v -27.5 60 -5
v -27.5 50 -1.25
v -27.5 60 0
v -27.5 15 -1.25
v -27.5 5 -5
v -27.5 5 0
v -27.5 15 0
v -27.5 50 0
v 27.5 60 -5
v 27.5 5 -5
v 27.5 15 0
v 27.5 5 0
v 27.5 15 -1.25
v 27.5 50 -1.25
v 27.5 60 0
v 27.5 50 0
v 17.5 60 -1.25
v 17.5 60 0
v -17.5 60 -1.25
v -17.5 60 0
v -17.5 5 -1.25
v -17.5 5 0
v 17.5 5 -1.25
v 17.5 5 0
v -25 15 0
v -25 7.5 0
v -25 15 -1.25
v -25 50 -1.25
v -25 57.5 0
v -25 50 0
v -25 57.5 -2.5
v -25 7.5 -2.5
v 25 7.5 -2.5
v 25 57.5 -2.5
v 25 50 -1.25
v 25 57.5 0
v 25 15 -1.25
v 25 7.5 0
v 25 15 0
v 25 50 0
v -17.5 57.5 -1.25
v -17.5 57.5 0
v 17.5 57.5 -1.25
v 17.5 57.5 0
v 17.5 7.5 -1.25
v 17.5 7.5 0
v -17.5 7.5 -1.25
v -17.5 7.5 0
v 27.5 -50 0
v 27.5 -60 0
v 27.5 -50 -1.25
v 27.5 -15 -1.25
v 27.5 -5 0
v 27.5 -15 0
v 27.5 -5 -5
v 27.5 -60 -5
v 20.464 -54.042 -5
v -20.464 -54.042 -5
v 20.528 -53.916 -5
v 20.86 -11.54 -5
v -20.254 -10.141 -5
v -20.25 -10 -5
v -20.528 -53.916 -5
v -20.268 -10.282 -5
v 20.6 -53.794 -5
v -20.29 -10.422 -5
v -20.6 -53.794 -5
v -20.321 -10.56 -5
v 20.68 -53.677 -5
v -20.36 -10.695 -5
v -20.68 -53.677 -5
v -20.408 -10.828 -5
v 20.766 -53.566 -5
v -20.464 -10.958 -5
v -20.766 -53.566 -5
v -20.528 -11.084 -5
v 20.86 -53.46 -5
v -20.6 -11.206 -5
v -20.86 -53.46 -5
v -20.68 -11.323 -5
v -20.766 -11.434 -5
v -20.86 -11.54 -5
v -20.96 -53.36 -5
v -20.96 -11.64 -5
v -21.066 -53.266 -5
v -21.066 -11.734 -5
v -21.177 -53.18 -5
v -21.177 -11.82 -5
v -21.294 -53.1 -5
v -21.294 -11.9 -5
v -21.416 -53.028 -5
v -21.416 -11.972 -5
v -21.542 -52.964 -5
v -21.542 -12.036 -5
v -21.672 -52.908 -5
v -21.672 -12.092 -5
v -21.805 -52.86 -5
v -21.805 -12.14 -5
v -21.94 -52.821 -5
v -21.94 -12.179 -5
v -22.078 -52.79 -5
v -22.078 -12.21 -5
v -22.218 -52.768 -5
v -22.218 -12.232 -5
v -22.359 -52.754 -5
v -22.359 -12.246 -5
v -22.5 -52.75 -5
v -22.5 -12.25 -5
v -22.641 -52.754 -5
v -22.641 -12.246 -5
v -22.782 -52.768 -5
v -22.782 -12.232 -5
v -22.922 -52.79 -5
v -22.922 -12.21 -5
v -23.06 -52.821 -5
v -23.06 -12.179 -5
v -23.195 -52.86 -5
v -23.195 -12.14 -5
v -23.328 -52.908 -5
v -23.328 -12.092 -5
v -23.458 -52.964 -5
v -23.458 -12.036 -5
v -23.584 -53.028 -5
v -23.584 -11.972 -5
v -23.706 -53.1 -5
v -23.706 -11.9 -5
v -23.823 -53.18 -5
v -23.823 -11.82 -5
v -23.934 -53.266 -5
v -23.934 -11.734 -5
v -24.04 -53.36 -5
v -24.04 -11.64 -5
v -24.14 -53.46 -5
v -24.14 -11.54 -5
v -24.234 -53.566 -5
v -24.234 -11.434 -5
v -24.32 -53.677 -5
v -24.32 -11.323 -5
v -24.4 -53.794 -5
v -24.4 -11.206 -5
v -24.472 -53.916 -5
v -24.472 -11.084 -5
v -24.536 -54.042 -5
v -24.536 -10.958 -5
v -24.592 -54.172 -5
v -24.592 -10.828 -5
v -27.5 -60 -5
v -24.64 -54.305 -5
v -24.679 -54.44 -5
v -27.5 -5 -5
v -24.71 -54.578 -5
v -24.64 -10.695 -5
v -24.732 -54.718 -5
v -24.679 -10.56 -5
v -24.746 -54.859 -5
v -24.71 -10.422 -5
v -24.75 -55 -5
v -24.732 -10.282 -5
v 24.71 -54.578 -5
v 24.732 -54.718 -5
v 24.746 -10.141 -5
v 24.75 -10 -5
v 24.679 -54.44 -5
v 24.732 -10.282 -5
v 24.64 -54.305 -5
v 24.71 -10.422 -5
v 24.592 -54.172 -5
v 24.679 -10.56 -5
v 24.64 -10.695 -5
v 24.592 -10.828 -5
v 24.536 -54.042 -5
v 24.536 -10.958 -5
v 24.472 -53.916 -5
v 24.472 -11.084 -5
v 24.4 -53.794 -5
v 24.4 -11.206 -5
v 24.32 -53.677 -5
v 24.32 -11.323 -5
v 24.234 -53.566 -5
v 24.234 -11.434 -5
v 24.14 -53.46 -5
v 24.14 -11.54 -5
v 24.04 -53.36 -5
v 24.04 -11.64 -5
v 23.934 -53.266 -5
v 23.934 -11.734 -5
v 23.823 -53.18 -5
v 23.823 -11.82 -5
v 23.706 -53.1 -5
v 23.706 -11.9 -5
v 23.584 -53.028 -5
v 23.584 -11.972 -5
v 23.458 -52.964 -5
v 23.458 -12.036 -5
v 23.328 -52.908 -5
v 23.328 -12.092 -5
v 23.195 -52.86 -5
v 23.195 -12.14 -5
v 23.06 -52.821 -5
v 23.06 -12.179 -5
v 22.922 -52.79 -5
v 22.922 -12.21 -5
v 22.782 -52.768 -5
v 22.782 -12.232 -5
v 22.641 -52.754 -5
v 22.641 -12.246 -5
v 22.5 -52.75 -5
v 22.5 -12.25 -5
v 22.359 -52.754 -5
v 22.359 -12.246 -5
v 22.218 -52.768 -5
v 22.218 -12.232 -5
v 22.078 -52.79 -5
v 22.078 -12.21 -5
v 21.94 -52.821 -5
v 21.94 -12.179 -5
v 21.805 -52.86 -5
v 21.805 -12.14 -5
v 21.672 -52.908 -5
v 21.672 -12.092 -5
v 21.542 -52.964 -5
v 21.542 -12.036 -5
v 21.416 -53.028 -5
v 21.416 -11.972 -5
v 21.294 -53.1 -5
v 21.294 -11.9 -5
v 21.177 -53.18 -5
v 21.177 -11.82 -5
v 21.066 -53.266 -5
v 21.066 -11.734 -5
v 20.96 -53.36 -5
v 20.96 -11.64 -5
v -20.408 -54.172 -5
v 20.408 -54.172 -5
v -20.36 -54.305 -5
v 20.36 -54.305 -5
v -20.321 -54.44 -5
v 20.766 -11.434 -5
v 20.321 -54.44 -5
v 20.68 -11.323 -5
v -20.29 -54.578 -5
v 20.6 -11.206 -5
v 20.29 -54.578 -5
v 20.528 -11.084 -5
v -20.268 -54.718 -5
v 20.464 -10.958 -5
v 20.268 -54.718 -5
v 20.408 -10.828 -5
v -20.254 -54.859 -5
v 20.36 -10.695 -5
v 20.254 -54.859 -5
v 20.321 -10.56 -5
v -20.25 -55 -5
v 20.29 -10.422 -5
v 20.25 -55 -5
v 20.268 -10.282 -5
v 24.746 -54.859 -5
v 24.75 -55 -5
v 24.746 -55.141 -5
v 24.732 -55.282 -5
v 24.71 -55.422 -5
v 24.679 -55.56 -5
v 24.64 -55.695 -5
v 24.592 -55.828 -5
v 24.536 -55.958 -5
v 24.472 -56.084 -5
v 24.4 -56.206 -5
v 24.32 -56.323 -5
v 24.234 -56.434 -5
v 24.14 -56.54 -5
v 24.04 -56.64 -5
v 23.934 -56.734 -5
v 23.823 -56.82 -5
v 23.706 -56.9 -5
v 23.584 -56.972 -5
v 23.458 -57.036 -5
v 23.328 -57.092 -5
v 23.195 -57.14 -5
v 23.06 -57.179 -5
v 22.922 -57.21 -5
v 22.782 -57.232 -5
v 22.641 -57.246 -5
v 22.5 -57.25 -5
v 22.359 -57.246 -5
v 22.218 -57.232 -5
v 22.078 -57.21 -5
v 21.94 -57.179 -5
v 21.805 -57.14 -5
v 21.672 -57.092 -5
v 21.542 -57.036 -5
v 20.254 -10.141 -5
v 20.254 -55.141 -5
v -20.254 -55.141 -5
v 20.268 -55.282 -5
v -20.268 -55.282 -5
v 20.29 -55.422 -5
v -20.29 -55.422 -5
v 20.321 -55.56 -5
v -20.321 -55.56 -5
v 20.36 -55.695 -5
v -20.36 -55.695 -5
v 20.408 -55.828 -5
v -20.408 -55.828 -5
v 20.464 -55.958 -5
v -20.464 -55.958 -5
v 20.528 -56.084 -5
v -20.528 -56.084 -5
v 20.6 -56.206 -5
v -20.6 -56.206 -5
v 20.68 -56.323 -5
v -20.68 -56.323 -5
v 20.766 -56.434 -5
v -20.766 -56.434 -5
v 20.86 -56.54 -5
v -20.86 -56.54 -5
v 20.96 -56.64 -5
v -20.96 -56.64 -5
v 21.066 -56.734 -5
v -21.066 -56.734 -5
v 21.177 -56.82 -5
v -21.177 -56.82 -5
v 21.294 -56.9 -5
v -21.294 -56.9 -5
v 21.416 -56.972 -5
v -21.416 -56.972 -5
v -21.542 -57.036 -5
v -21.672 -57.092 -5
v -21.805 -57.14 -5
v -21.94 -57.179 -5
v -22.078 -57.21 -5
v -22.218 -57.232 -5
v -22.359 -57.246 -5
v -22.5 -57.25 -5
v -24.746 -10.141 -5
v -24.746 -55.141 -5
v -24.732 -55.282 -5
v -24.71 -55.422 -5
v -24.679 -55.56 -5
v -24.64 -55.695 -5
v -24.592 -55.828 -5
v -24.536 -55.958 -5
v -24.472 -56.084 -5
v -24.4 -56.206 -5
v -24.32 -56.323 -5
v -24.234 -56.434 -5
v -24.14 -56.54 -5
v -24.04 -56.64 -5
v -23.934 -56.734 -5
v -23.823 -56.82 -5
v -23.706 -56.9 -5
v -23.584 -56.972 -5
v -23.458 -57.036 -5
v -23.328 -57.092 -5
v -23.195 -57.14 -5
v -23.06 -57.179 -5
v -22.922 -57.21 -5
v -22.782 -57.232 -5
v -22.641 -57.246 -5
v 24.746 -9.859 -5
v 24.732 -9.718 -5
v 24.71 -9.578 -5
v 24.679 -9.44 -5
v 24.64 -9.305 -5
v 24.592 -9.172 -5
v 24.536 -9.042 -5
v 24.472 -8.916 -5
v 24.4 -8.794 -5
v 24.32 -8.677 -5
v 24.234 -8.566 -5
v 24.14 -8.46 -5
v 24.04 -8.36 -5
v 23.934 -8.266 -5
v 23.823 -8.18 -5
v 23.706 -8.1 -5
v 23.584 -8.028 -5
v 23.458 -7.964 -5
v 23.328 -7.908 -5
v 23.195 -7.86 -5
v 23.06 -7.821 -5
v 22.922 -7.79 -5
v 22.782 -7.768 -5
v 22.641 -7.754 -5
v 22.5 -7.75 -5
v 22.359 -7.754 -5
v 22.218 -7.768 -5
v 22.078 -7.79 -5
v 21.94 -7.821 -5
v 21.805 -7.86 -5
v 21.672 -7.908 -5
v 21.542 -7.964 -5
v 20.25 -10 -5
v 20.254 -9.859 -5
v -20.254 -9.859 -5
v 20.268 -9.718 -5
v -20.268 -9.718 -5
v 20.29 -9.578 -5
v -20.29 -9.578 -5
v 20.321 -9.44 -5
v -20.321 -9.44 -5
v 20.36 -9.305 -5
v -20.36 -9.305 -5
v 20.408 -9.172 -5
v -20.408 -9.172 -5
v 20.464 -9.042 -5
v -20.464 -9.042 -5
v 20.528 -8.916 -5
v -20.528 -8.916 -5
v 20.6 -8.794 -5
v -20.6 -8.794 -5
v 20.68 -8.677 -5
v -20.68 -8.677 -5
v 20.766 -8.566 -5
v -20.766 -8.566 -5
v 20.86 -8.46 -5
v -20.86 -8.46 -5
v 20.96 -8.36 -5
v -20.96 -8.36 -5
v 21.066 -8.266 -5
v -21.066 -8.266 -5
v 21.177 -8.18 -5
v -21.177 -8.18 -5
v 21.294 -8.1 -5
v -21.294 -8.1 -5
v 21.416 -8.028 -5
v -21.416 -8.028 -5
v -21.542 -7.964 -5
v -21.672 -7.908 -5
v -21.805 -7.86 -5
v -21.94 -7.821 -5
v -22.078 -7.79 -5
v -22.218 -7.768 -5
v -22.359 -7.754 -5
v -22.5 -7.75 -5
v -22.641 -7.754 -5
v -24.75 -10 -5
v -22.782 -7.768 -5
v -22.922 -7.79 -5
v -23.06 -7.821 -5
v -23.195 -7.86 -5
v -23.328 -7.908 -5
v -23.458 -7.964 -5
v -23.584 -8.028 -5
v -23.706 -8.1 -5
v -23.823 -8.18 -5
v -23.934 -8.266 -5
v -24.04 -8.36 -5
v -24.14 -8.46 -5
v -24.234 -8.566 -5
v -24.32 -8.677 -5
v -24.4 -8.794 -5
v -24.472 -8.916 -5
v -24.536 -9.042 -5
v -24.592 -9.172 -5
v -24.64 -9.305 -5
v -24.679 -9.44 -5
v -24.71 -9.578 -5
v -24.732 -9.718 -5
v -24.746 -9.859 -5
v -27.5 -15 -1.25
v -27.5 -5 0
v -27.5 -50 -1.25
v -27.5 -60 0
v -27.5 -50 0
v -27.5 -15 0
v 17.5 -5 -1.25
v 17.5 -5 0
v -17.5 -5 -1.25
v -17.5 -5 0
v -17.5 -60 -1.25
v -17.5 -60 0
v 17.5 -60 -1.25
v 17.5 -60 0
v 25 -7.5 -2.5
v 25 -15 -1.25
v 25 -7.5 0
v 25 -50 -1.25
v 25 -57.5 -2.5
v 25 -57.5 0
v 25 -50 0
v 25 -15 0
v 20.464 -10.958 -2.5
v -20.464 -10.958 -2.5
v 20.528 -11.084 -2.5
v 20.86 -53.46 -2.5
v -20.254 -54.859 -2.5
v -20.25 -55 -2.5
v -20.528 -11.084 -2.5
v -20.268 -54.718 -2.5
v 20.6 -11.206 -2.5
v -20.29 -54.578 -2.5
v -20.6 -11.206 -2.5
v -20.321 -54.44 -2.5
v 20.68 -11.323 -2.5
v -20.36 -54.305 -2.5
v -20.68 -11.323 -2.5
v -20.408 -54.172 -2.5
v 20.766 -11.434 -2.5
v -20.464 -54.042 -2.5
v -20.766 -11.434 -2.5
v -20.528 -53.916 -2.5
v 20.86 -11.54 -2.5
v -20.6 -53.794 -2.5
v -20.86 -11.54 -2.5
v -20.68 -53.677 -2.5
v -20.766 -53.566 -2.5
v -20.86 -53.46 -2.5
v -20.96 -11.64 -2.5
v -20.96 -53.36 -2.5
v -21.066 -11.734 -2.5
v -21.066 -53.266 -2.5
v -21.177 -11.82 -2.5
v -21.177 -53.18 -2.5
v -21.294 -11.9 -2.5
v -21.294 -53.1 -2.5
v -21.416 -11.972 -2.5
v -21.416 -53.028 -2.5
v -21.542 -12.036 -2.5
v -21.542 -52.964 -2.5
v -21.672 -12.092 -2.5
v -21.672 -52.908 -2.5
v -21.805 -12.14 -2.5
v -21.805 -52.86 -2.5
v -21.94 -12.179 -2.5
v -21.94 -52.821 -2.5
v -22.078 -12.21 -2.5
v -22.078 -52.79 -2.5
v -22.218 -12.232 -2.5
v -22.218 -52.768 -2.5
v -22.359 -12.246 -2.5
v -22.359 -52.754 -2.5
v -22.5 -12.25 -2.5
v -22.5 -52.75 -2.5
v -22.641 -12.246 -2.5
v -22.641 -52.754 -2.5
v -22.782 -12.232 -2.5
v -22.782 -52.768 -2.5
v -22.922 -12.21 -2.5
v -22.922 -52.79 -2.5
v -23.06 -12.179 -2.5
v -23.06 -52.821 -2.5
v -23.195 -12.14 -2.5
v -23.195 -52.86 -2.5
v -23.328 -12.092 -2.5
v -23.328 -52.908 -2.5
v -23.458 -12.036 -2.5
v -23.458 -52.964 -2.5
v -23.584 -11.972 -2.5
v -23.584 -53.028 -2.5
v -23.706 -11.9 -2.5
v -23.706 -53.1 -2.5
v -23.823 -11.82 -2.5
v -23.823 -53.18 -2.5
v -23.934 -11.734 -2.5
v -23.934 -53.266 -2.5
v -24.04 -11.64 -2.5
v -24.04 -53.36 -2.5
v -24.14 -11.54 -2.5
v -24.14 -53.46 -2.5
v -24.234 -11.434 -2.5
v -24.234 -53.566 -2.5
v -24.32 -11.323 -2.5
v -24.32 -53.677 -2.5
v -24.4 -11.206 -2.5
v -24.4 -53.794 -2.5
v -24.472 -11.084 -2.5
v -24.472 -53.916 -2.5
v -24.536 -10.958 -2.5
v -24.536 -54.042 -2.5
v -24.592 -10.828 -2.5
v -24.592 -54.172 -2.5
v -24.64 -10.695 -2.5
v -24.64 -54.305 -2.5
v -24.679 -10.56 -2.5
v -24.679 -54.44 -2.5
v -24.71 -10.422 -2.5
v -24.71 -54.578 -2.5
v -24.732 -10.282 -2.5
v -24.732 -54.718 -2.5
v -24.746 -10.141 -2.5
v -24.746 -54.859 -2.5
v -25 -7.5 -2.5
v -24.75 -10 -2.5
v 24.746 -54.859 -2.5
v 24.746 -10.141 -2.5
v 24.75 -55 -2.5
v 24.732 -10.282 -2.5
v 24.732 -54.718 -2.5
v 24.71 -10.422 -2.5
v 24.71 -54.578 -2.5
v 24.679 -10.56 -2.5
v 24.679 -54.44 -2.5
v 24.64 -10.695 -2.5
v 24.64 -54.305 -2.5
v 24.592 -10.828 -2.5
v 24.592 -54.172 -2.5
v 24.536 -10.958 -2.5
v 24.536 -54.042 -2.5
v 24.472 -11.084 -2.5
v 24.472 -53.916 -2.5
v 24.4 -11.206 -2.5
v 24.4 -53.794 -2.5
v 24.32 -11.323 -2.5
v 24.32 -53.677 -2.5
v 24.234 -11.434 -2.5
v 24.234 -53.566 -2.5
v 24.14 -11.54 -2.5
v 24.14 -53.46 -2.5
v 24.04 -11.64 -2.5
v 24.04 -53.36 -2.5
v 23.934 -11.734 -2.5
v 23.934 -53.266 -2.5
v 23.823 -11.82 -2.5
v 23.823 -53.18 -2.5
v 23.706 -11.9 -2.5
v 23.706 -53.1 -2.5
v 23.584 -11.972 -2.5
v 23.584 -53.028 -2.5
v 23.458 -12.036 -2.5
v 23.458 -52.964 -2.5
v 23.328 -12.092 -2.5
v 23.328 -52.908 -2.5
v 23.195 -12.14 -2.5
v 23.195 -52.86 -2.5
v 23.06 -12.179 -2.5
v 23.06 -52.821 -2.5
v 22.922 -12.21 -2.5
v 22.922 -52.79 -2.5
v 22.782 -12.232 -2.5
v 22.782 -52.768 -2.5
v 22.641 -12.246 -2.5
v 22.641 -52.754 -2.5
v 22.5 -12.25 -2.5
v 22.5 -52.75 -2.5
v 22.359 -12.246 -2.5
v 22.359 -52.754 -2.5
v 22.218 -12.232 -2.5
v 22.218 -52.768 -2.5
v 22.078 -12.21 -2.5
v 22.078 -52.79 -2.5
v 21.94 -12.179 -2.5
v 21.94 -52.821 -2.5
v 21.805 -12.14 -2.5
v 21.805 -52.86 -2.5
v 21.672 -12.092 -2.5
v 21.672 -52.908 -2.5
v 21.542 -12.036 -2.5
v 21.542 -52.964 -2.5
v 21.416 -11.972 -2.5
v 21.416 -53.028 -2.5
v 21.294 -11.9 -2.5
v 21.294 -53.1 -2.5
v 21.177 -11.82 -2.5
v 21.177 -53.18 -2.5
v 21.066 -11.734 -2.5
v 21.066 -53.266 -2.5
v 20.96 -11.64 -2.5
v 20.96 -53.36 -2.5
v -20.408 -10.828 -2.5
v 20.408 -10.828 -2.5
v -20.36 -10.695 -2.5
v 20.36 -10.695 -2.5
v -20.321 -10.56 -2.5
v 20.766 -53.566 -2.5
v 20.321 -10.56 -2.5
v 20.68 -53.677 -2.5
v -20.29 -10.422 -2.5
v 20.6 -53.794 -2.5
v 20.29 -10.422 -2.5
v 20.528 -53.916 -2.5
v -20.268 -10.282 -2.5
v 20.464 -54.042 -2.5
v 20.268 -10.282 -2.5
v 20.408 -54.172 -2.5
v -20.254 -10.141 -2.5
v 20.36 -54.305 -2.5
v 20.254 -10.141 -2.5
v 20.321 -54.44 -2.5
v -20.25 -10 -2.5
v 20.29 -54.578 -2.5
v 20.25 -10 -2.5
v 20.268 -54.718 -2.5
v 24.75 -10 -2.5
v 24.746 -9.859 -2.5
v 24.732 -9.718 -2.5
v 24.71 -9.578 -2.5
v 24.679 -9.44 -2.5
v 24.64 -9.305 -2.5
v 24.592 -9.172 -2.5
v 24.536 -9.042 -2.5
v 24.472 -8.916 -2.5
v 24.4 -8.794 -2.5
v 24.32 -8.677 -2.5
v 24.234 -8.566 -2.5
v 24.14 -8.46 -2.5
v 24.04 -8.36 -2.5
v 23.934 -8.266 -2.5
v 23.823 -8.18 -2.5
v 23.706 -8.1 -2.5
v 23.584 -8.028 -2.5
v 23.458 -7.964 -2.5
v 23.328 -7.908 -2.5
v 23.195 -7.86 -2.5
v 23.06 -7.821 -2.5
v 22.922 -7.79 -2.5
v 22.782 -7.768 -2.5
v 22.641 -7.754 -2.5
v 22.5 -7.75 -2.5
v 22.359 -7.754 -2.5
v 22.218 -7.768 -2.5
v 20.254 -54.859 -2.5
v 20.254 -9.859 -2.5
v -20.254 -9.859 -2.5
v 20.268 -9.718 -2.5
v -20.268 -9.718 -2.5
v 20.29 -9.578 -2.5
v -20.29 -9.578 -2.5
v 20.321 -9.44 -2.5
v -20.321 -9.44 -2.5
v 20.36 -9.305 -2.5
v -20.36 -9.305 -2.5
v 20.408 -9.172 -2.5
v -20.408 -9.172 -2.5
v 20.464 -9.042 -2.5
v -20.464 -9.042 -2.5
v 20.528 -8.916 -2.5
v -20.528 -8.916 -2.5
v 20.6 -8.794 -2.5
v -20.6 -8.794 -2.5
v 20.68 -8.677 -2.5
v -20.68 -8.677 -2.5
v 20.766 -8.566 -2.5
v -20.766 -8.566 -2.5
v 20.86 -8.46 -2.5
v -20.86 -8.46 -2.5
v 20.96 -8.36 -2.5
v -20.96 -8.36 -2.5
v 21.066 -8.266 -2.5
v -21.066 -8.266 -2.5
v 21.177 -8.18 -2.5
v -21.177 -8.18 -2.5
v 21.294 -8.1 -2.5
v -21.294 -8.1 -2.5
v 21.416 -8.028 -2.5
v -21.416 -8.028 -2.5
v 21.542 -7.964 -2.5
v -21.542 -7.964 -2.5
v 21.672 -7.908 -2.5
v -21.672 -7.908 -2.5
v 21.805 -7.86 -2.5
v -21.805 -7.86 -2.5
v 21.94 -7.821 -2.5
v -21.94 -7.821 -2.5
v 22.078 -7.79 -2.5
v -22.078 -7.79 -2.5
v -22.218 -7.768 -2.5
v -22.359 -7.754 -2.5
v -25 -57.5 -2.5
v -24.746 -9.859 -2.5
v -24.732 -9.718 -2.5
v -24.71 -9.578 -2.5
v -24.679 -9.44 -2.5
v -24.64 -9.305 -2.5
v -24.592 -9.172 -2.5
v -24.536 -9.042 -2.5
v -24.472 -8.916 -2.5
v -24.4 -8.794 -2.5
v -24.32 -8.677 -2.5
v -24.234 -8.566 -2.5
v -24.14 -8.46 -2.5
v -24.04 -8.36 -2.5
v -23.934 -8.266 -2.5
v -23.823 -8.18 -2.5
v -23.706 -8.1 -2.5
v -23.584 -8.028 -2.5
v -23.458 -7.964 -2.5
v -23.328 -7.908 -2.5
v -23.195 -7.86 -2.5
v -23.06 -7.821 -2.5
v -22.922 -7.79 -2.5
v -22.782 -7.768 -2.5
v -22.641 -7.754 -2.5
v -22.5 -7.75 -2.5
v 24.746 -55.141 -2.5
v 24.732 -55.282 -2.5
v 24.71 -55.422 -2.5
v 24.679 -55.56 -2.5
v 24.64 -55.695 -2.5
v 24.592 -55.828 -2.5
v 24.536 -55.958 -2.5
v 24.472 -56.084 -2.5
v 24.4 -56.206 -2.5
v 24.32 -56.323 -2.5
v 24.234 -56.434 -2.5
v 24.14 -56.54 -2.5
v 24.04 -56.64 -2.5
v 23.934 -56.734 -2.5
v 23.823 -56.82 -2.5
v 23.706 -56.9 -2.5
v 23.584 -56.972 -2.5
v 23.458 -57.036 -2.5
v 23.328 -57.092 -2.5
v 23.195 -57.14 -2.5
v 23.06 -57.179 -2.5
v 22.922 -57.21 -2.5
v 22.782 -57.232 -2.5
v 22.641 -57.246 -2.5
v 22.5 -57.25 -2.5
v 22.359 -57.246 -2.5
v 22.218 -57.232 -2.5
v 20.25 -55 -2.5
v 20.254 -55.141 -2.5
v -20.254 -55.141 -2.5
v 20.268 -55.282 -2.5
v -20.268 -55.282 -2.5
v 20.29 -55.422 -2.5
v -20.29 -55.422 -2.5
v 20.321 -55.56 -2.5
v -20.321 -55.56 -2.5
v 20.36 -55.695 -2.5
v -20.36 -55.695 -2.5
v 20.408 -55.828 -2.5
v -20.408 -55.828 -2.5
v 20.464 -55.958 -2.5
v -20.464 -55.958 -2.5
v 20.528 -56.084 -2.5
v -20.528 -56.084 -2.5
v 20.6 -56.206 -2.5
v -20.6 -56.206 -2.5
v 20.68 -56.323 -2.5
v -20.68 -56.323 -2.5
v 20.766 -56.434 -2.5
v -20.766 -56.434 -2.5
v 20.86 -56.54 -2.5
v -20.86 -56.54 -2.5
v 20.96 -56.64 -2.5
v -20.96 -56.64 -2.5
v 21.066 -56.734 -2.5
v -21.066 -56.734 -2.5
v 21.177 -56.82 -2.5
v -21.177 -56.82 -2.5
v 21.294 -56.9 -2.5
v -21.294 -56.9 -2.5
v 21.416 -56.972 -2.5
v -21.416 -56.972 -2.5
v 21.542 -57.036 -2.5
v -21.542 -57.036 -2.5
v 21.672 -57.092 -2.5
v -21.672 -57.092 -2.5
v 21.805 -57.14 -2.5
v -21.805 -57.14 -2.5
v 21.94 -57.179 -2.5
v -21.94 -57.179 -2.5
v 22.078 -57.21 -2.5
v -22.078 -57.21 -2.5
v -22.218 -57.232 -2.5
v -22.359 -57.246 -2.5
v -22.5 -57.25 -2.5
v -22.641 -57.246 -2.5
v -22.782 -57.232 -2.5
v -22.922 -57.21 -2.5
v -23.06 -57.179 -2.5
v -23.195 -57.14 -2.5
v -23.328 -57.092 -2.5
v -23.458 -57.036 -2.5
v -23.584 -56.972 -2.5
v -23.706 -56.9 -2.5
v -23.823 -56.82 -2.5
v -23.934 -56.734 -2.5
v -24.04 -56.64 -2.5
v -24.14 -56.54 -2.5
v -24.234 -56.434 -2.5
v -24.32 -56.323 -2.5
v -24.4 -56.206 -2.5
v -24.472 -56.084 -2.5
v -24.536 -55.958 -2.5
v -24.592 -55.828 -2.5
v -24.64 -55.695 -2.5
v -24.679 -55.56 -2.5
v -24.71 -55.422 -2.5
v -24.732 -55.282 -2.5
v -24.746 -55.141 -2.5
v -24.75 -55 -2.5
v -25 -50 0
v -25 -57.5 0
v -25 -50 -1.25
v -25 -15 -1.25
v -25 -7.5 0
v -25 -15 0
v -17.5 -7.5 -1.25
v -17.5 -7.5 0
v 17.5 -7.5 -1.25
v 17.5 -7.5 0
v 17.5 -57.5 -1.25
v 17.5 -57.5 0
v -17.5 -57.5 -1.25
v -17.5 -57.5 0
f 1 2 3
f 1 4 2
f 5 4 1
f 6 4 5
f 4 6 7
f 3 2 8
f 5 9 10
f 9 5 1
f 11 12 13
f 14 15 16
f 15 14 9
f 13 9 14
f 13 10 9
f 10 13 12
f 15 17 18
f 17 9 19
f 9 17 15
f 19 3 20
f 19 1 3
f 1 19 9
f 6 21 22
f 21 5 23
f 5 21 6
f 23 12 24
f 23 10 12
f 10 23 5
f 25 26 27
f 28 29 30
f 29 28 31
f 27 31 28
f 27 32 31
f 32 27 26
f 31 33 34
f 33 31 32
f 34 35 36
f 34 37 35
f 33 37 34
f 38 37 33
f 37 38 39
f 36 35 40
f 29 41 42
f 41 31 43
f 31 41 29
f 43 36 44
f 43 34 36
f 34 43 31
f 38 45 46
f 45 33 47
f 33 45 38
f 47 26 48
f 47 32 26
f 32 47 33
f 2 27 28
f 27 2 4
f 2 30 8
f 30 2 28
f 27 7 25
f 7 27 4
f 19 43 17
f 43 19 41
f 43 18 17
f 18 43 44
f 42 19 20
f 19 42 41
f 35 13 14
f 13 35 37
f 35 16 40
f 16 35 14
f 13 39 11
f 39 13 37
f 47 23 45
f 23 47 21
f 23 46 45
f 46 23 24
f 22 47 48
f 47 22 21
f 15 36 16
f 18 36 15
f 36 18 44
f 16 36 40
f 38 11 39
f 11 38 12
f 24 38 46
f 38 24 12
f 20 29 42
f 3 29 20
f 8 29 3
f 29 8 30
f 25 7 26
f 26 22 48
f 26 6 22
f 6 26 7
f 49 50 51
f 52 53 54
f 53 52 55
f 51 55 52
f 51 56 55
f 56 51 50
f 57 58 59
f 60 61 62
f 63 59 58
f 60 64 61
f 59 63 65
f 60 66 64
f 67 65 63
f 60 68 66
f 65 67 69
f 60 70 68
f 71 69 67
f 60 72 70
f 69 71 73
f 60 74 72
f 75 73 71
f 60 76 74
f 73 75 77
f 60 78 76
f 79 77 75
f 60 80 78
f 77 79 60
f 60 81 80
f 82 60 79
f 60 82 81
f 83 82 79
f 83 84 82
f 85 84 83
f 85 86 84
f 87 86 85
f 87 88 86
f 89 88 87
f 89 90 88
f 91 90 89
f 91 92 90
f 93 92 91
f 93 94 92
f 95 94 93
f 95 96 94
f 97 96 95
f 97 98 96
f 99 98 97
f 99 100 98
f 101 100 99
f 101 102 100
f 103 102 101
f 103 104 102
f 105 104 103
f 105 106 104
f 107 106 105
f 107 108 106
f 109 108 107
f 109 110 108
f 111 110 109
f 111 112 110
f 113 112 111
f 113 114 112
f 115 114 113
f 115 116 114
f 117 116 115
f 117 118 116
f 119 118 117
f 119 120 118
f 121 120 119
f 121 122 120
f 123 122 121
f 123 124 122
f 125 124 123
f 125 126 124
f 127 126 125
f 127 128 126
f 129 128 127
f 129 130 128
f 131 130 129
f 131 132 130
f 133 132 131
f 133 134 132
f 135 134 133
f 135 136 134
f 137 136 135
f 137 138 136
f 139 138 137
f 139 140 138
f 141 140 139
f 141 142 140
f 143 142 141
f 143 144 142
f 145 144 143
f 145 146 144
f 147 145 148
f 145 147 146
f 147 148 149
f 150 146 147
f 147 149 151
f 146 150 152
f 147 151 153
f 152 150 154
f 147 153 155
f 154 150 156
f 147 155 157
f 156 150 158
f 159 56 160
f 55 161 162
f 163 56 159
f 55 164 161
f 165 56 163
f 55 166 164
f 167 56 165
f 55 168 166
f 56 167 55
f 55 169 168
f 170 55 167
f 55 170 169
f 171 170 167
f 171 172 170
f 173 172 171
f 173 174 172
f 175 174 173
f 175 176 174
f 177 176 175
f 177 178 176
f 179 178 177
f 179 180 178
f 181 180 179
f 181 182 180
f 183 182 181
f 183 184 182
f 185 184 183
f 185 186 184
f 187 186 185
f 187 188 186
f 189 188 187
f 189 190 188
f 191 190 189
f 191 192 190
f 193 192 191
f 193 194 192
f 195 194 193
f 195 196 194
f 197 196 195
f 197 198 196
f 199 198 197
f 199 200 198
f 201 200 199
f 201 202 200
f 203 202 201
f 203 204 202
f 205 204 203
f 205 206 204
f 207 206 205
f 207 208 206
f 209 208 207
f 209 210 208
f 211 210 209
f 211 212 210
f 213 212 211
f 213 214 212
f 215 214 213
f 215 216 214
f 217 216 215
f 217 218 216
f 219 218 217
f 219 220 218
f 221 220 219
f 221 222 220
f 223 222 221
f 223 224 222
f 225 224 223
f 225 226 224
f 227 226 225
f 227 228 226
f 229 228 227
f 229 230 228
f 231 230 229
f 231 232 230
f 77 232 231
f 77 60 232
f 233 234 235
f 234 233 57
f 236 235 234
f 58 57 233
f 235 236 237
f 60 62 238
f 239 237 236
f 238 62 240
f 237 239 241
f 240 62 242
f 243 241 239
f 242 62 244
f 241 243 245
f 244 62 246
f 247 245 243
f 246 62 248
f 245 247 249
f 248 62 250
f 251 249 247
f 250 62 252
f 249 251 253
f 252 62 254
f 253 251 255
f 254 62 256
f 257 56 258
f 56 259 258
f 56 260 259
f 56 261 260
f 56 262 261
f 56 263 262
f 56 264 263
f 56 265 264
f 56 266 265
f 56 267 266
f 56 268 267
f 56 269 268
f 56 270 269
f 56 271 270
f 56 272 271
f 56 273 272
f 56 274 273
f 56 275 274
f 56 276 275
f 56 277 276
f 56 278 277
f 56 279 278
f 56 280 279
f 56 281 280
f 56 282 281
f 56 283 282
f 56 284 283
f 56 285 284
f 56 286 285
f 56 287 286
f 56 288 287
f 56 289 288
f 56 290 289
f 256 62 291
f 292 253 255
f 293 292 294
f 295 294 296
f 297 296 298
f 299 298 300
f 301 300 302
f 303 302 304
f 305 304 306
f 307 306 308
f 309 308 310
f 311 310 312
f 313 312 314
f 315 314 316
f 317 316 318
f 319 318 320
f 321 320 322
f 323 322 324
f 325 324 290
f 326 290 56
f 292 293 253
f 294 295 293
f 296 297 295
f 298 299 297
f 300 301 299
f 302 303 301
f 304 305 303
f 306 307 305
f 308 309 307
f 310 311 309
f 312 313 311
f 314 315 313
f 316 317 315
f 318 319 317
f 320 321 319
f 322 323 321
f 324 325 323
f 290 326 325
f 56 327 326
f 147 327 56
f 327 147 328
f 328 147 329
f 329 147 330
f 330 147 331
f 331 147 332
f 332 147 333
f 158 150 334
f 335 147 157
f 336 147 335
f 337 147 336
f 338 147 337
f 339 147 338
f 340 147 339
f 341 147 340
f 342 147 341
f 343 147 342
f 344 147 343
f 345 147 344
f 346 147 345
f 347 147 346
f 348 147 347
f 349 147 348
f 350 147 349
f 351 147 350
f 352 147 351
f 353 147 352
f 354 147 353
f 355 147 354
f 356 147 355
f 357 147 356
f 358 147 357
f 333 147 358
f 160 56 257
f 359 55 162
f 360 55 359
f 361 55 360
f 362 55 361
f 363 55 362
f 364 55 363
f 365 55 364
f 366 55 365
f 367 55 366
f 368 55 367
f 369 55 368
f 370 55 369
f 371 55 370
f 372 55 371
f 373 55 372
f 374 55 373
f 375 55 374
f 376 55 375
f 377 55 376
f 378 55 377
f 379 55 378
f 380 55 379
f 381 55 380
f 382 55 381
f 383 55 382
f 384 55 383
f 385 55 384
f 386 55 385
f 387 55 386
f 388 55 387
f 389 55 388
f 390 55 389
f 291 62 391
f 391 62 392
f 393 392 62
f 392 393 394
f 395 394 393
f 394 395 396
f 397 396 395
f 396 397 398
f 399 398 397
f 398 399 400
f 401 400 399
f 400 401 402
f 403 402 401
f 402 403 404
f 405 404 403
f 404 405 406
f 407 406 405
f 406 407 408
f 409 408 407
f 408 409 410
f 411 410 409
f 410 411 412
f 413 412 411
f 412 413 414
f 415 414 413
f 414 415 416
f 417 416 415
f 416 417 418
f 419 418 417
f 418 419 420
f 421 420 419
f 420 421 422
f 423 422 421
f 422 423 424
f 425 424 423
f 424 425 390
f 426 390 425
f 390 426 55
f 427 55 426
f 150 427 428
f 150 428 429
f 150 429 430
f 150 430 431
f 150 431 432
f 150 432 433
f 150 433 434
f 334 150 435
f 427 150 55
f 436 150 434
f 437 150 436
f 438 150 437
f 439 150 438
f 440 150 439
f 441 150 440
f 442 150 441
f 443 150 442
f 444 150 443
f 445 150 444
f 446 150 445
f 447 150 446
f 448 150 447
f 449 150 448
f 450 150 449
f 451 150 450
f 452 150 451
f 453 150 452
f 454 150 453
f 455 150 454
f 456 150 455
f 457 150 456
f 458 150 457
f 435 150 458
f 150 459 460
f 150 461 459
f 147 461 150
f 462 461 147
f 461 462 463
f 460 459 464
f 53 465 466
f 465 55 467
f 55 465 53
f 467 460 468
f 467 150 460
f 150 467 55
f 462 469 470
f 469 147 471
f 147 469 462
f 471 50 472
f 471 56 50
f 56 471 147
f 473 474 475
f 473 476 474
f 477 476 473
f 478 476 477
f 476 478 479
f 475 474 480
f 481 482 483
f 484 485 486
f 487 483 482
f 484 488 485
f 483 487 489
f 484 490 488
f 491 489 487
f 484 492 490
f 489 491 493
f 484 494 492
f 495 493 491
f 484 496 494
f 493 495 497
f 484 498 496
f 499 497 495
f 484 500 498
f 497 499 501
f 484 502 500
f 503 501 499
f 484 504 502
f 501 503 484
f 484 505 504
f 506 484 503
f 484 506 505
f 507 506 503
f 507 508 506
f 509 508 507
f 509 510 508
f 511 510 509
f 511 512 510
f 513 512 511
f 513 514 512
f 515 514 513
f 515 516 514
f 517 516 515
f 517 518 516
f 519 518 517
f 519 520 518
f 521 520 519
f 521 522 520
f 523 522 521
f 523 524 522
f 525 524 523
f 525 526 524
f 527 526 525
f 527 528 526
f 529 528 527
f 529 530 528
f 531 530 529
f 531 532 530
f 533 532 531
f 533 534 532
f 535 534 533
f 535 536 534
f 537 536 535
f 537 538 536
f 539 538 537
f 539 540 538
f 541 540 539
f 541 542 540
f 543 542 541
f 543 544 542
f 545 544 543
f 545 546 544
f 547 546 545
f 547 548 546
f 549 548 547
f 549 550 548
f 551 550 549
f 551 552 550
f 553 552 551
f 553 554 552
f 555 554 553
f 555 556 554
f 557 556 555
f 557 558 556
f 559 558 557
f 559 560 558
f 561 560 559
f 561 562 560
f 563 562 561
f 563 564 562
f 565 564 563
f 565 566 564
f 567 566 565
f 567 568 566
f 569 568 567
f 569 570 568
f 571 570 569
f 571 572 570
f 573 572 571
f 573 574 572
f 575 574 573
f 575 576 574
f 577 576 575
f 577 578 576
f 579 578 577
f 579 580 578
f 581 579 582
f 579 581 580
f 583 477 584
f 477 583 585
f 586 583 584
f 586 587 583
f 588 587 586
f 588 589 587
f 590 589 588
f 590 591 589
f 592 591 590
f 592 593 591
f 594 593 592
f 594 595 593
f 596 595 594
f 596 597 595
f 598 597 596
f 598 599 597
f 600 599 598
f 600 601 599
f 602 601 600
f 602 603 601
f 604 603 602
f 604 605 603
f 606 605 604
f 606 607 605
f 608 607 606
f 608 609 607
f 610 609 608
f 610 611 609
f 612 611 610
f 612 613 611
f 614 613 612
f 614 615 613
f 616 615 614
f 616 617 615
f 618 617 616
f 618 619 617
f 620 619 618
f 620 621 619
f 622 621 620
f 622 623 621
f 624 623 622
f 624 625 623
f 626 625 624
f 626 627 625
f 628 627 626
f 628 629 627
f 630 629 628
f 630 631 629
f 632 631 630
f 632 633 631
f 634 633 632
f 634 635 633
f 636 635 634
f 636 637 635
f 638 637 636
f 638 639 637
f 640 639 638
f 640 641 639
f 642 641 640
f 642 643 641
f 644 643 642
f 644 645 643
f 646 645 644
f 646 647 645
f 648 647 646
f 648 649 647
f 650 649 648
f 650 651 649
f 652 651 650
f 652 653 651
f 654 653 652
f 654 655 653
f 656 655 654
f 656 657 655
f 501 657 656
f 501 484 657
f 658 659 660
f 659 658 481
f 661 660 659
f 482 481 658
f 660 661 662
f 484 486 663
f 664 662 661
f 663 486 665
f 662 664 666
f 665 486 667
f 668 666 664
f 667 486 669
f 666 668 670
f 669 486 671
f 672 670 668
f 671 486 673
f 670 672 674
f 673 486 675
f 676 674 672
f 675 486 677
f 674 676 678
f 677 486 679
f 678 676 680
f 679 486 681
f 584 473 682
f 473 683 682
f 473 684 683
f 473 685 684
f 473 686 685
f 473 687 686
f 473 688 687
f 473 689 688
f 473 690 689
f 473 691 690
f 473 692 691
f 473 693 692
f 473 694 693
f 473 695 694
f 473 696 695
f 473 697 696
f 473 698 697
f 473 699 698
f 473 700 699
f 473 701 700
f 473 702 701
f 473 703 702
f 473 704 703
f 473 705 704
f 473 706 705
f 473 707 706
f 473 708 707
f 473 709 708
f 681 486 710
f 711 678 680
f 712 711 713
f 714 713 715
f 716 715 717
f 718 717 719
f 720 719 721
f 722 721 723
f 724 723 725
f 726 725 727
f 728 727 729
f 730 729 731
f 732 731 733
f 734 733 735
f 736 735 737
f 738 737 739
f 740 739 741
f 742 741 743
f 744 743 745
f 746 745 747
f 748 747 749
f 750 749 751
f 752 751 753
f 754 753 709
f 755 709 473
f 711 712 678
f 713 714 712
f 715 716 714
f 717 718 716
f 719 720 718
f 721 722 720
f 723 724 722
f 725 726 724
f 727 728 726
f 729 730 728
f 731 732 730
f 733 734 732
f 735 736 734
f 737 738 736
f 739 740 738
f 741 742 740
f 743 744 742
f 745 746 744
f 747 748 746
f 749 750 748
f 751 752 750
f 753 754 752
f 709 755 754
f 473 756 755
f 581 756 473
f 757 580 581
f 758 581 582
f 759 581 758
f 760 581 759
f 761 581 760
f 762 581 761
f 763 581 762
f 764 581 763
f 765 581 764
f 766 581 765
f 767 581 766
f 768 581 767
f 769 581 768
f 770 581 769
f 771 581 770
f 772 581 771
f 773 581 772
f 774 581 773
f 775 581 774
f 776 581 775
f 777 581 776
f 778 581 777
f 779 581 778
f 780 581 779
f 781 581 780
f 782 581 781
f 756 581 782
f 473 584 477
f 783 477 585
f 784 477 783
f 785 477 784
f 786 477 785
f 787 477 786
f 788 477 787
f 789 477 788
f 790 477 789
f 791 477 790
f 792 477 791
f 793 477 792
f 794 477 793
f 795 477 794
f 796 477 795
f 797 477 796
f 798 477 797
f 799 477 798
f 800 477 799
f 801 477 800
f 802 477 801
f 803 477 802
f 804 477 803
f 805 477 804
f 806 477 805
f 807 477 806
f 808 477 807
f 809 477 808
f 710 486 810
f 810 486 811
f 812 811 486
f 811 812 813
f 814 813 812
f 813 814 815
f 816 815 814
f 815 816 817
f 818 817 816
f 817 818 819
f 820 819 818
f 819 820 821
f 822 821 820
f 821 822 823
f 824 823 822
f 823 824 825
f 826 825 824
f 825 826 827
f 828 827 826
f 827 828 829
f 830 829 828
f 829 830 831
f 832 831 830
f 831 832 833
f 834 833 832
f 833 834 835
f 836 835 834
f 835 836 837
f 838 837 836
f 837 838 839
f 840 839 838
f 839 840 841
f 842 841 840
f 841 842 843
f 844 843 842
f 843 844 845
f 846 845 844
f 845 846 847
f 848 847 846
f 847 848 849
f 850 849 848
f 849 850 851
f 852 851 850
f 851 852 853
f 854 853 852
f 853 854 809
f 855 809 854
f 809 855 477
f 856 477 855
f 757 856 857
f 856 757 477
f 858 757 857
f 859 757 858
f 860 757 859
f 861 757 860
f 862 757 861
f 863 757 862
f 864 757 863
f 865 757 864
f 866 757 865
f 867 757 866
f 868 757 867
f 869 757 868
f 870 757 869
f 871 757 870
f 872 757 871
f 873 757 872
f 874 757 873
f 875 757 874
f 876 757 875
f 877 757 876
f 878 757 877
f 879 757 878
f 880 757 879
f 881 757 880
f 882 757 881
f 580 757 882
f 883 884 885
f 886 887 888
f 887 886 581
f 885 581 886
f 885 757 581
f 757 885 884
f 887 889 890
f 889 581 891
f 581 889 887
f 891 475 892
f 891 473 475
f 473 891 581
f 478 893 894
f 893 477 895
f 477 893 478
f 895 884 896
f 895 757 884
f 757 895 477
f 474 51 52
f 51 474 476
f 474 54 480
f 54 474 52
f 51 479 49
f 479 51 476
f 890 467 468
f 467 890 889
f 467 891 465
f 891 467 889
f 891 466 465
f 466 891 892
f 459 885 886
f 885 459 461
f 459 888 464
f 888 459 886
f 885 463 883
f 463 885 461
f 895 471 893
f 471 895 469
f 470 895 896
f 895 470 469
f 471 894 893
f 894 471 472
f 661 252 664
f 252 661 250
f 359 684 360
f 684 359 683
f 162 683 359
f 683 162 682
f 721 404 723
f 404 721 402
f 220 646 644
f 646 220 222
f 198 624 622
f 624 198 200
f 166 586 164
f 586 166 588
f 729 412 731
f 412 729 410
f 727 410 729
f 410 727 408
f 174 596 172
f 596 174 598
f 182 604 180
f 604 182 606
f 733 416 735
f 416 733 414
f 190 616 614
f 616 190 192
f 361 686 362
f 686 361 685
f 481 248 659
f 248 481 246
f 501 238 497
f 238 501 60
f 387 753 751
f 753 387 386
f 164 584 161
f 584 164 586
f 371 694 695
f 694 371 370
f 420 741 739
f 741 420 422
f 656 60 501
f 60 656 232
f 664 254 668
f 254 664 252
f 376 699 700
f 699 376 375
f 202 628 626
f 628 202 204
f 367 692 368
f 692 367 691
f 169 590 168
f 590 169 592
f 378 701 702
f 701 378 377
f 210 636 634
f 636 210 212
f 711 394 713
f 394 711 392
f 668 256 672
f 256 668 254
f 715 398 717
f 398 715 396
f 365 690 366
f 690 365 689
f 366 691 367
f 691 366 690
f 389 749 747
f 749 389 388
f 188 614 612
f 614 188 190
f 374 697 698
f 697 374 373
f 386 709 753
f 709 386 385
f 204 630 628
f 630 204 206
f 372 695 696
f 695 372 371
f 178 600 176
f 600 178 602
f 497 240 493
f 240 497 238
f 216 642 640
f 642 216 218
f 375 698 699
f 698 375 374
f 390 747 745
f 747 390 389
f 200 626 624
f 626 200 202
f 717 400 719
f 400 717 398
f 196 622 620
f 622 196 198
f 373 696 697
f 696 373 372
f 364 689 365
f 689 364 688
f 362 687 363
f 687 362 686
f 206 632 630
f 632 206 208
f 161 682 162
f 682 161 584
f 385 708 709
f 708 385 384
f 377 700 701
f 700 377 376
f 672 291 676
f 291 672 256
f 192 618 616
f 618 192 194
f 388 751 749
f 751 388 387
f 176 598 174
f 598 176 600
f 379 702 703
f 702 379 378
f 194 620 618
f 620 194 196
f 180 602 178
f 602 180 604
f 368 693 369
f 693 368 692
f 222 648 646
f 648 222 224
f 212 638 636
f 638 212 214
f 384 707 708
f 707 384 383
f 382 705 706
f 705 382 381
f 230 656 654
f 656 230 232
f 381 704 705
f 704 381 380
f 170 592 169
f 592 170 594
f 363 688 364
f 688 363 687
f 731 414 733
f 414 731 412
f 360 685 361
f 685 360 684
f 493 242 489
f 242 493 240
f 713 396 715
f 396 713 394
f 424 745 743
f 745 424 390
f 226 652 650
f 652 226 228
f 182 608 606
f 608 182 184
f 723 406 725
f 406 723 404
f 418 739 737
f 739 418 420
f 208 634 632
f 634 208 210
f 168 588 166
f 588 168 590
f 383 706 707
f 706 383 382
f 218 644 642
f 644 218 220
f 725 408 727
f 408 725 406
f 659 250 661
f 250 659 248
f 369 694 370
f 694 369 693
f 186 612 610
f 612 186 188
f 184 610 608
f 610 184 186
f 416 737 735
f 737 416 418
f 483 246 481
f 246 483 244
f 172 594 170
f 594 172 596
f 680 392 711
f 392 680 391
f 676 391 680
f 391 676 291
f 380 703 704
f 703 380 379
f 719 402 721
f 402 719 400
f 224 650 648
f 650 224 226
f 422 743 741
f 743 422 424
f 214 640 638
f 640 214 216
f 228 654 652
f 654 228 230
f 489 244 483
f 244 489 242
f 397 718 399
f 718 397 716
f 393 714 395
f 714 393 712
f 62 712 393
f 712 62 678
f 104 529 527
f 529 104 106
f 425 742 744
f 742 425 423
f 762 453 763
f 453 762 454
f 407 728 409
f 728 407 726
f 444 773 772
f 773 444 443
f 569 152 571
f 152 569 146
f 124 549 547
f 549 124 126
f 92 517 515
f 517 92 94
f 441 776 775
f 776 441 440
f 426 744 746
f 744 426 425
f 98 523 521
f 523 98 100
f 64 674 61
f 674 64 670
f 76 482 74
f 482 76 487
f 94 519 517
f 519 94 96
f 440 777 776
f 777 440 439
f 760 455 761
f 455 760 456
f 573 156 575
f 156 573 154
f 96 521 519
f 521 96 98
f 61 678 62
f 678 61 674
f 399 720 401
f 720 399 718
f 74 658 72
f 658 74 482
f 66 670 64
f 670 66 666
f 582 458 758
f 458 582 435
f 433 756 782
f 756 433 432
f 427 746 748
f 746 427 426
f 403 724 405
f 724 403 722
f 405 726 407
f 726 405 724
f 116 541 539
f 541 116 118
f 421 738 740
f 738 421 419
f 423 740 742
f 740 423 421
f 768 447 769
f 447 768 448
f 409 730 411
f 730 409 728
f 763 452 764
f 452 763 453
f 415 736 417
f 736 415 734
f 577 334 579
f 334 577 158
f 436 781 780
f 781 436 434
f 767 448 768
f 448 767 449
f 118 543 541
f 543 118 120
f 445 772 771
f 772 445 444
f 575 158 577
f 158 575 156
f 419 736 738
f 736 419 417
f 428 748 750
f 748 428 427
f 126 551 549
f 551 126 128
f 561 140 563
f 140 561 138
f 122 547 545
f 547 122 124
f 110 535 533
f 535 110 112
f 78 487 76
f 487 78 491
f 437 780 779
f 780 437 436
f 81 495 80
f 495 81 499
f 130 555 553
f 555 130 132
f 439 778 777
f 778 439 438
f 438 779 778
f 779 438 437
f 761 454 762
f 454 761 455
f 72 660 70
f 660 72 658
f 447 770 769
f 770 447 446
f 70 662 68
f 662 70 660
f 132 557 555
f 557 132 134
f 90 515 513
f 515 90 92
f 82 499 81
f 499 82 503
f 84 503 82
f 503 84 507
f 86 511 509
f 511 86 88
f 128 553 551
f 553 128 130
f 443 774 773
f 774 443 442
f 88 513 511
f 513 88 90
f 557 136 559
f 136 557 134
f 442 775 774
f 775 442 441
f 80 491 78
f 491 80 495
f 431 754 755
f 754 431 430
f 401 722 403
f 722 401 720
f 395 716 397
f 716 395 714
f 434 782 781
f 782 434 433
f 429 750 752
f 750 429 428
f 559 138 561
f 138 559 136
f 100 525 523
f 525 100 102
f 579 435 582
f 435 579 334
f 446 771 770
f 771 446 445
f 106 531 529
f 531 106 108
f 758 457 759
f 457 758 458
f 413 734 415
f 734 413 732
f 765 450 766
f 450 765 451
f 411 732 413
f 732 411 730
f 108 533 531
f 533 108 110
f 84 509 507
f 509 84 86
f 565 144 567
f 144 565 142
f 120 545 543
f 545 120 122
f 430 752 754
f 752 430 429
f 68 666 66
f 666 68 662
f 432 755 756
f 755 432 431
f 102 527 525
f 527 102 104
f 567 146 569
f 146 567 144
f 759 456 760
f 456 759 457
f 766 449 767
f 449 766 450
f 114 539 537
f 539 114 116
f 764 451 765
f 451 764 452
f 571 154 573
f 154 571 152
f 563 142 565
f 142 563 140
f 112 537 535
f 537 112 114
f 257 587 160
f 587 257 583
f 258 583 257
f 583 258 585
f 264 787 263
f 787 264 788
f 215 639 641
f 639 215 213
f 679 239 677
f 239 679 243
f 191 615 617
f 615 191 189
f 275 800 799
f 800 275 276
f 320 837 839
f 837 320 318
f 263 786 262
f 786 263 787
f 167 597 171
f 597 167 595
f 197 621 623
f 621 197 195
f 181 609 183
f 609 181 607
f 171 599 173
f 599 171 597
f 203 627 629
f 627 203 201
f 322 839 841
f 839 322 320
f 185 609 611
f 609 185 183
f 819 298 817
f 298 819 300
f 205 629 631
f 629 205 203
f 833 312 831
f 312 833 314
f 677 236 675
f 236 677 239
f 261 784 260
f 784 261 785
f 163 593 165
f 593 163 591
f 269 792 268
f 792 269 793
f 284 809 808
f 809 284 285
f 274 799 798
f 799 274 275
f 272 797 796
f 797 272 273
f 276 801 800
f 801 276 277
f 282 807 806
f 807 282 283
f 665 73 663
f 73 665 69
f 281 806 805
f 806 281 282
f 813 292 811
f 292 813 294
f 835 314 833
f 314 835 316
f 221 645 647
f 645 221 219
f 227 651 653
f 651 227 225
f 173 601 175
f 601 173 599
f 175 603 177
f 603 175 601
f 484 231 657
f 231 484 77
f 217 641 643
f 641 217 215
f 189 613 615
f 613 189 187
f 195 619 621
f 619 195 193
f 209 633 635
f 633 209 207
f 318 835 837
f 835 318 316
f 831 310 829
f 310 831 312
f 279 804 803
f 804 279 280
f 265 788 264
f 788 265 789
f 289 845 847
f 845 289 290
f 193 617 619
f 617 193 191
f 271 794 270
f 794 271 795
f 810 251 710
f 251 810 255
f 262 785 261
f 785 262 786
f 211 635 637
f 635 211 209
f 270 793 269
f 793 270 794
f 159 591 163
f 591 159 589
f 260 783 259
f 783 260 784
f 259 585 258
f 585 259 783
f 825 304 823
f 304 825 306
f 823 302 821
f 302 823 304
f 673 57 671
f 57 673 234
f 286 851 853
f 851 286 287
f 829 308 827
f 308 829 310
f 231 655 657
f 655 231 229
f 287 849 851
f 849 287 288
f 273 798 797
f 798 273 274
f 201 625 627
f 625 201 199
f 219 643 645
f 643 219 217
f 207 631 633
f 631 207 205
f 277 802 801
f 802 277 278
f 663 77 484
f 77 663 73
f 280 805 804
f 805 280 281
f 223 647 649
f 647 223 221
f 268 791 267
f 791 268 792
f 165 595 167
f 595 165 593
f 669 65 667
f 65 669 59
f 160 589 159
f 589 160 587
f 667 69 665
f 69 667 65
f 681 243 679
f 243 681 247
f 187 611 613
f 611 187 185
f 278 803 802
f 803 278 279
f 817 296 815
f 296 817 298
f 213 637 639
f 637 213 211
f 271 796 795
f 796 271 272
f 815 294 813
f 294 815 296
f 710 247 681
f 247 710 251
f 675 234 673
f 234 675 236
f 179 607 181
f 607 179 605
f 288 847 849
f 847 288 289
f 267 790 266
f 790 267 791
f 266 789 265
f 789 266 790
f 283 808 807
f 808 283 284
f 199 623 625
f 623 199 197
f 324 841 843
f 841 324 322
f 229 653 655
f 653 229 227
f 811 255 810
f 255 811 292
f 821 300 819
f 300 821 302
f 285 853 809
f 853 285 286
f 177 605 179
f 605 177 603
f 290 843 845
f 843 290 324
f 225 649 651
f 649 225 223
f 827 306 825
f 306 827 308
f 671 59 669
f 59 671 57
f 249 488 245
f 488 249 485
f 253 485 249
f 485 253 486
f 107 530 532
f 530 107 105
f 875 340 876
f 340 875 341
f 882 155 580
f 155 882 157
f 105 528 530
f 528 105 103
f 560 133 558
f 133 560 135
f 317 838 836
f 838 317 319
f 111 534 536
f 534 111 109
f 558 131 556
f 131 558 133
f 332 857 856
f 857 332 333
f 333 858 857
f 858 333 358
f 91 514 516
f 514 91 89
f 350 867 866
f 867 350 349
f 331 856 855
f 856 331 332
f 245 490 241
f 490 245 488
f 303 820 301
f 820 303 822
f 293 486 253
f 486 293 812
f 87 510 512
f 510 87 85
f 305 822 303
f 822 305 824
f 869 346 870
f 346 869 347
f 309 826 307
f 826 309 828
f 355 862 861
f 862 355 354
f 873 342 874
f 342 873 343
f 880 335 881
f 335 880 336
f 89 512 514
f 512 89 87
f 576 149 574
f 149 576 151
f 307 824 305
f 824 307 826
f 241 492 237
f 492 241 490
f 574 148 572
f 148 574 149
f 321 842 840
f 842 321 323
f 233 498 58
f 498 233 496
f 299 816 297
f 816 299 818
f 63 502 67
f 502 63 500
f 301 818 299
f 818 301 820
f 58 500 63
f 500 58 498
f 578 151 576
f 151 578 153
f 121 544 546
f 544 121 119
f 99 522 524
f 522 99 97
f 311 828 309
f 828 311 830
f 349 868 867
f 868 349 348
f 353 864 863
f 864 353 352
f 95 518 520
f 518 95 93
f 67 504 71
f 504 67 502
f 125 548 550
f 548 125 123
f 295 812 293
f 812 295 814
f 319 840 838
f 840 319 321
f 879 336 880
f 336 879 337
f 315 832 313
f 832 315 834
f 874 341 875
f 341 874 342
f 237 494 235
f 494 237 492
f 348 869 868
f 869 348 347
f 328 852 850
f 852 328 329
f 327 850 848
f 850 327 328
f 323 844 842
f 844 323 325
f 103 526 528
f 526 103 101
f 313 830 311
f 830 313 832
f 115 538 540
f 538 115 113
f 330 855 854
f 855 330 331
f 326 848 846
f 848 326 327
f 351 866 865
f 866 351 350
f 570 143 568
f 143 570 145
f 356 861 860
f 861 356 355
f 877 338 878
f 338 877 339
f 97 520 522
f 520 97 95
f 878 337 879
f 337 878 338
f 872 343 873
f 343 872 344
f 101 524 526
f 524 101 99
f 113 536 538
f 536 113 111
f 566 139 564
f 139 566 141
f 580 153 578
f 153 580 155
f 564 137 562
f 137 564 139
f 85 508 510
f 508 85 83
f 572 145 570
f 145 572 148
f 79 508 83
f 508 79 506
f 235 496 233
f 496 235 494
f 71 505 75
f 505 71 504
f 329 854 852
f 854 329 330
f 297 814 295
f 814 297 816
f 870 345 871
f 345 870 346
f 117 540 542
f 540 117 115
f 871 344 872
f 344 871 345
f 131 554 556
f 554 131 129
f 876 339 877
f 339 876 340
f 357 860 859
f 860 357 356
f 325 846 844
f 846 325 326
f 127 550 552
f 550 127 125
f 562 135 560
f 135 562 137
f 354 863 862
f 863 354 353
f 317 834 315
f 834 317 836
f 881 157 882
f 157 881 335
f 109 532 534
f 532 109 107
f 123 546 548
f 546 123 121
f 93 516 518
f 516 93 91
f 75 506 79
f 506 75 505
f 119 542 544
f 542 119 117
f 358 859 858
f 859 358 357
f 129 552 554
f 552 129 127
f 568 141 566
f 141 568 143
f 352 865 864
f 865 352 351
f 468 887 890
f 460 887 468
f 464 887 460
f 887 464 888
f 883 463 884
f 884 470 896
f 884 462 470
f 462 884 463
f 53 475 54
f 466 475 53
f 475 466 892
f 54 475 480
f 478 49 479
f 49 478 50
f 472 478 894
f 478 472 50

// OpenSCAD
boxX = 55;
boxY = 55;
boxZ = 10;
boxThick = 2.5;

slitWidth = 35;
slitHeight = 2.5;
distSlits = 2;

mountPatternX = 45;
mountPatternY = 45;
holeSize = 4.5;

numOfSlits = 1;
distPlates = 10;

sfn = 100;

module slit() {
    cube([boxThick*3, slitWidth, slitHeight], center=true);
}
module hole() {
    cylinder(r=holeSize/2, h = boxThick * 3, $fn = sfn);
}


module slits() {
    if (numOfSlits == 1) {
        translate([boxX/2,0,0]) {
            slit();
        }
    }
    else if(numOfSlits == 2) {
        translate([boxX/2, (slitWidth+distSlits)/2, 0]) {
                slit();
            }
            translate([boxX/2, (slitWidth+distSlits)/-2, 0]) {
                slit();
            }
    }
    else if(numOfSlits % 2 > 0) {     //If the number of slits is an odd number:
        translate([boxX/2,0,0]) { //Put one slit in the middle.
            slit();
        }
        for (numOfSlits = [1:(numOfSlits-1)/2]) { //Then, put half the sits on one side of middle slit, and half on the other. 
            translate([boxX/2, (slitWidth+distSlits)*-numOfSlits, 0]) { //Move the slits on the edge of the middle slit, then move them more based on the user-set distance of slits. This is one side of slits.
                slit();
            }
            translate([boxX/2, (slitWidth+distSlits)*numOfSlits, 0]) { //Move the slits on the edge of the middle slit, then move them more based on the user-set distance of slits. This is one side of slits.
                slit();
            }
        }
    }
    else if(numOfSlits % 2 == 0) { //If the number of slits is even
        //Creating the two middle pieces
        translate([boxX/2, (slitWidth+distSlits)/-2, 0]) {
            slit();
        }
        translate([boxX/2, (slitWidth+distSlits)/2, 0]) {
            slit();
         }
         //Make half of the amount of slits that exist, minus the first two:
         for(numOfSlits = [2:numOfSlits/2]) {
             //The 0.5 in both of these is in reference to above, compensating for it negatively. For the negative one, the value is positive, for the positive one, the value is negative. 
             translate([boxX/2, (slitWidth+distSlits)*(numOfSlits-0.5), 0]) {
                    slit();
             }
             translate([boxX/2, (slitWidth+distSlits)*(0.5-numOfSlits), 0]) {
                 slit();
             }
         }
    }
    else {
        //Something went wrong
     }
 } 
    


module holes() {
    translate([mountPatternX/2, mountPatternY/2,(boxZ+boxThick)/-2]) {
        hole();
    }
    translate([mountPatternX/-2, mountPatternY/2, (boxZ+boxThick)/-2]) {
        hole();
    }
    translate([mountPatternX/2, mountPatternY/-2, (boxZ+boxThick)/-2]) {
        hole();
    }
    translate([mountPatternX/-2, mountPatternY/-2, (boxZ+boxThick)/-2]) {
        hole();
    }
}

module box() {
    difference() {
        cube([boxX, boxY, boxZ], center=true);
        cube([boxX-boxThick*2, boxY-boxThick*2, boxZ-boxThick*2],center=true);
        rotate([0,0,0]) {
            slits();
        }
        rotate([0,0,90]) {
            slits();
        }
        rotate([0,0,180]) {
            slits();
        }
        rotate([0,0,270]) {
            slits();
        }
    }
}




module bottomPlate() {
    difference() {
        box();
        holes();
        translate([0,0,boxZ/2]) {
            cube([boxX+1, boxY+1, boxZ], center=true);
        }
    }
}

module topPlate() {
    rotate([0,180,0]) {
        difference() {
            box();
            translate([0,0,boxZ/-2]) {
                cube([boxX+1, boxY+1, boxZ], center=true);
            }
        }
    }
}

module plates() {
    translate([0, (distPlates+boxY)/2, 0]) {
        topPlate();
    }
    translate([0, (distPlates+boxY)/-2, 0]) {
        bottomPlate();
    }
}

plates();
